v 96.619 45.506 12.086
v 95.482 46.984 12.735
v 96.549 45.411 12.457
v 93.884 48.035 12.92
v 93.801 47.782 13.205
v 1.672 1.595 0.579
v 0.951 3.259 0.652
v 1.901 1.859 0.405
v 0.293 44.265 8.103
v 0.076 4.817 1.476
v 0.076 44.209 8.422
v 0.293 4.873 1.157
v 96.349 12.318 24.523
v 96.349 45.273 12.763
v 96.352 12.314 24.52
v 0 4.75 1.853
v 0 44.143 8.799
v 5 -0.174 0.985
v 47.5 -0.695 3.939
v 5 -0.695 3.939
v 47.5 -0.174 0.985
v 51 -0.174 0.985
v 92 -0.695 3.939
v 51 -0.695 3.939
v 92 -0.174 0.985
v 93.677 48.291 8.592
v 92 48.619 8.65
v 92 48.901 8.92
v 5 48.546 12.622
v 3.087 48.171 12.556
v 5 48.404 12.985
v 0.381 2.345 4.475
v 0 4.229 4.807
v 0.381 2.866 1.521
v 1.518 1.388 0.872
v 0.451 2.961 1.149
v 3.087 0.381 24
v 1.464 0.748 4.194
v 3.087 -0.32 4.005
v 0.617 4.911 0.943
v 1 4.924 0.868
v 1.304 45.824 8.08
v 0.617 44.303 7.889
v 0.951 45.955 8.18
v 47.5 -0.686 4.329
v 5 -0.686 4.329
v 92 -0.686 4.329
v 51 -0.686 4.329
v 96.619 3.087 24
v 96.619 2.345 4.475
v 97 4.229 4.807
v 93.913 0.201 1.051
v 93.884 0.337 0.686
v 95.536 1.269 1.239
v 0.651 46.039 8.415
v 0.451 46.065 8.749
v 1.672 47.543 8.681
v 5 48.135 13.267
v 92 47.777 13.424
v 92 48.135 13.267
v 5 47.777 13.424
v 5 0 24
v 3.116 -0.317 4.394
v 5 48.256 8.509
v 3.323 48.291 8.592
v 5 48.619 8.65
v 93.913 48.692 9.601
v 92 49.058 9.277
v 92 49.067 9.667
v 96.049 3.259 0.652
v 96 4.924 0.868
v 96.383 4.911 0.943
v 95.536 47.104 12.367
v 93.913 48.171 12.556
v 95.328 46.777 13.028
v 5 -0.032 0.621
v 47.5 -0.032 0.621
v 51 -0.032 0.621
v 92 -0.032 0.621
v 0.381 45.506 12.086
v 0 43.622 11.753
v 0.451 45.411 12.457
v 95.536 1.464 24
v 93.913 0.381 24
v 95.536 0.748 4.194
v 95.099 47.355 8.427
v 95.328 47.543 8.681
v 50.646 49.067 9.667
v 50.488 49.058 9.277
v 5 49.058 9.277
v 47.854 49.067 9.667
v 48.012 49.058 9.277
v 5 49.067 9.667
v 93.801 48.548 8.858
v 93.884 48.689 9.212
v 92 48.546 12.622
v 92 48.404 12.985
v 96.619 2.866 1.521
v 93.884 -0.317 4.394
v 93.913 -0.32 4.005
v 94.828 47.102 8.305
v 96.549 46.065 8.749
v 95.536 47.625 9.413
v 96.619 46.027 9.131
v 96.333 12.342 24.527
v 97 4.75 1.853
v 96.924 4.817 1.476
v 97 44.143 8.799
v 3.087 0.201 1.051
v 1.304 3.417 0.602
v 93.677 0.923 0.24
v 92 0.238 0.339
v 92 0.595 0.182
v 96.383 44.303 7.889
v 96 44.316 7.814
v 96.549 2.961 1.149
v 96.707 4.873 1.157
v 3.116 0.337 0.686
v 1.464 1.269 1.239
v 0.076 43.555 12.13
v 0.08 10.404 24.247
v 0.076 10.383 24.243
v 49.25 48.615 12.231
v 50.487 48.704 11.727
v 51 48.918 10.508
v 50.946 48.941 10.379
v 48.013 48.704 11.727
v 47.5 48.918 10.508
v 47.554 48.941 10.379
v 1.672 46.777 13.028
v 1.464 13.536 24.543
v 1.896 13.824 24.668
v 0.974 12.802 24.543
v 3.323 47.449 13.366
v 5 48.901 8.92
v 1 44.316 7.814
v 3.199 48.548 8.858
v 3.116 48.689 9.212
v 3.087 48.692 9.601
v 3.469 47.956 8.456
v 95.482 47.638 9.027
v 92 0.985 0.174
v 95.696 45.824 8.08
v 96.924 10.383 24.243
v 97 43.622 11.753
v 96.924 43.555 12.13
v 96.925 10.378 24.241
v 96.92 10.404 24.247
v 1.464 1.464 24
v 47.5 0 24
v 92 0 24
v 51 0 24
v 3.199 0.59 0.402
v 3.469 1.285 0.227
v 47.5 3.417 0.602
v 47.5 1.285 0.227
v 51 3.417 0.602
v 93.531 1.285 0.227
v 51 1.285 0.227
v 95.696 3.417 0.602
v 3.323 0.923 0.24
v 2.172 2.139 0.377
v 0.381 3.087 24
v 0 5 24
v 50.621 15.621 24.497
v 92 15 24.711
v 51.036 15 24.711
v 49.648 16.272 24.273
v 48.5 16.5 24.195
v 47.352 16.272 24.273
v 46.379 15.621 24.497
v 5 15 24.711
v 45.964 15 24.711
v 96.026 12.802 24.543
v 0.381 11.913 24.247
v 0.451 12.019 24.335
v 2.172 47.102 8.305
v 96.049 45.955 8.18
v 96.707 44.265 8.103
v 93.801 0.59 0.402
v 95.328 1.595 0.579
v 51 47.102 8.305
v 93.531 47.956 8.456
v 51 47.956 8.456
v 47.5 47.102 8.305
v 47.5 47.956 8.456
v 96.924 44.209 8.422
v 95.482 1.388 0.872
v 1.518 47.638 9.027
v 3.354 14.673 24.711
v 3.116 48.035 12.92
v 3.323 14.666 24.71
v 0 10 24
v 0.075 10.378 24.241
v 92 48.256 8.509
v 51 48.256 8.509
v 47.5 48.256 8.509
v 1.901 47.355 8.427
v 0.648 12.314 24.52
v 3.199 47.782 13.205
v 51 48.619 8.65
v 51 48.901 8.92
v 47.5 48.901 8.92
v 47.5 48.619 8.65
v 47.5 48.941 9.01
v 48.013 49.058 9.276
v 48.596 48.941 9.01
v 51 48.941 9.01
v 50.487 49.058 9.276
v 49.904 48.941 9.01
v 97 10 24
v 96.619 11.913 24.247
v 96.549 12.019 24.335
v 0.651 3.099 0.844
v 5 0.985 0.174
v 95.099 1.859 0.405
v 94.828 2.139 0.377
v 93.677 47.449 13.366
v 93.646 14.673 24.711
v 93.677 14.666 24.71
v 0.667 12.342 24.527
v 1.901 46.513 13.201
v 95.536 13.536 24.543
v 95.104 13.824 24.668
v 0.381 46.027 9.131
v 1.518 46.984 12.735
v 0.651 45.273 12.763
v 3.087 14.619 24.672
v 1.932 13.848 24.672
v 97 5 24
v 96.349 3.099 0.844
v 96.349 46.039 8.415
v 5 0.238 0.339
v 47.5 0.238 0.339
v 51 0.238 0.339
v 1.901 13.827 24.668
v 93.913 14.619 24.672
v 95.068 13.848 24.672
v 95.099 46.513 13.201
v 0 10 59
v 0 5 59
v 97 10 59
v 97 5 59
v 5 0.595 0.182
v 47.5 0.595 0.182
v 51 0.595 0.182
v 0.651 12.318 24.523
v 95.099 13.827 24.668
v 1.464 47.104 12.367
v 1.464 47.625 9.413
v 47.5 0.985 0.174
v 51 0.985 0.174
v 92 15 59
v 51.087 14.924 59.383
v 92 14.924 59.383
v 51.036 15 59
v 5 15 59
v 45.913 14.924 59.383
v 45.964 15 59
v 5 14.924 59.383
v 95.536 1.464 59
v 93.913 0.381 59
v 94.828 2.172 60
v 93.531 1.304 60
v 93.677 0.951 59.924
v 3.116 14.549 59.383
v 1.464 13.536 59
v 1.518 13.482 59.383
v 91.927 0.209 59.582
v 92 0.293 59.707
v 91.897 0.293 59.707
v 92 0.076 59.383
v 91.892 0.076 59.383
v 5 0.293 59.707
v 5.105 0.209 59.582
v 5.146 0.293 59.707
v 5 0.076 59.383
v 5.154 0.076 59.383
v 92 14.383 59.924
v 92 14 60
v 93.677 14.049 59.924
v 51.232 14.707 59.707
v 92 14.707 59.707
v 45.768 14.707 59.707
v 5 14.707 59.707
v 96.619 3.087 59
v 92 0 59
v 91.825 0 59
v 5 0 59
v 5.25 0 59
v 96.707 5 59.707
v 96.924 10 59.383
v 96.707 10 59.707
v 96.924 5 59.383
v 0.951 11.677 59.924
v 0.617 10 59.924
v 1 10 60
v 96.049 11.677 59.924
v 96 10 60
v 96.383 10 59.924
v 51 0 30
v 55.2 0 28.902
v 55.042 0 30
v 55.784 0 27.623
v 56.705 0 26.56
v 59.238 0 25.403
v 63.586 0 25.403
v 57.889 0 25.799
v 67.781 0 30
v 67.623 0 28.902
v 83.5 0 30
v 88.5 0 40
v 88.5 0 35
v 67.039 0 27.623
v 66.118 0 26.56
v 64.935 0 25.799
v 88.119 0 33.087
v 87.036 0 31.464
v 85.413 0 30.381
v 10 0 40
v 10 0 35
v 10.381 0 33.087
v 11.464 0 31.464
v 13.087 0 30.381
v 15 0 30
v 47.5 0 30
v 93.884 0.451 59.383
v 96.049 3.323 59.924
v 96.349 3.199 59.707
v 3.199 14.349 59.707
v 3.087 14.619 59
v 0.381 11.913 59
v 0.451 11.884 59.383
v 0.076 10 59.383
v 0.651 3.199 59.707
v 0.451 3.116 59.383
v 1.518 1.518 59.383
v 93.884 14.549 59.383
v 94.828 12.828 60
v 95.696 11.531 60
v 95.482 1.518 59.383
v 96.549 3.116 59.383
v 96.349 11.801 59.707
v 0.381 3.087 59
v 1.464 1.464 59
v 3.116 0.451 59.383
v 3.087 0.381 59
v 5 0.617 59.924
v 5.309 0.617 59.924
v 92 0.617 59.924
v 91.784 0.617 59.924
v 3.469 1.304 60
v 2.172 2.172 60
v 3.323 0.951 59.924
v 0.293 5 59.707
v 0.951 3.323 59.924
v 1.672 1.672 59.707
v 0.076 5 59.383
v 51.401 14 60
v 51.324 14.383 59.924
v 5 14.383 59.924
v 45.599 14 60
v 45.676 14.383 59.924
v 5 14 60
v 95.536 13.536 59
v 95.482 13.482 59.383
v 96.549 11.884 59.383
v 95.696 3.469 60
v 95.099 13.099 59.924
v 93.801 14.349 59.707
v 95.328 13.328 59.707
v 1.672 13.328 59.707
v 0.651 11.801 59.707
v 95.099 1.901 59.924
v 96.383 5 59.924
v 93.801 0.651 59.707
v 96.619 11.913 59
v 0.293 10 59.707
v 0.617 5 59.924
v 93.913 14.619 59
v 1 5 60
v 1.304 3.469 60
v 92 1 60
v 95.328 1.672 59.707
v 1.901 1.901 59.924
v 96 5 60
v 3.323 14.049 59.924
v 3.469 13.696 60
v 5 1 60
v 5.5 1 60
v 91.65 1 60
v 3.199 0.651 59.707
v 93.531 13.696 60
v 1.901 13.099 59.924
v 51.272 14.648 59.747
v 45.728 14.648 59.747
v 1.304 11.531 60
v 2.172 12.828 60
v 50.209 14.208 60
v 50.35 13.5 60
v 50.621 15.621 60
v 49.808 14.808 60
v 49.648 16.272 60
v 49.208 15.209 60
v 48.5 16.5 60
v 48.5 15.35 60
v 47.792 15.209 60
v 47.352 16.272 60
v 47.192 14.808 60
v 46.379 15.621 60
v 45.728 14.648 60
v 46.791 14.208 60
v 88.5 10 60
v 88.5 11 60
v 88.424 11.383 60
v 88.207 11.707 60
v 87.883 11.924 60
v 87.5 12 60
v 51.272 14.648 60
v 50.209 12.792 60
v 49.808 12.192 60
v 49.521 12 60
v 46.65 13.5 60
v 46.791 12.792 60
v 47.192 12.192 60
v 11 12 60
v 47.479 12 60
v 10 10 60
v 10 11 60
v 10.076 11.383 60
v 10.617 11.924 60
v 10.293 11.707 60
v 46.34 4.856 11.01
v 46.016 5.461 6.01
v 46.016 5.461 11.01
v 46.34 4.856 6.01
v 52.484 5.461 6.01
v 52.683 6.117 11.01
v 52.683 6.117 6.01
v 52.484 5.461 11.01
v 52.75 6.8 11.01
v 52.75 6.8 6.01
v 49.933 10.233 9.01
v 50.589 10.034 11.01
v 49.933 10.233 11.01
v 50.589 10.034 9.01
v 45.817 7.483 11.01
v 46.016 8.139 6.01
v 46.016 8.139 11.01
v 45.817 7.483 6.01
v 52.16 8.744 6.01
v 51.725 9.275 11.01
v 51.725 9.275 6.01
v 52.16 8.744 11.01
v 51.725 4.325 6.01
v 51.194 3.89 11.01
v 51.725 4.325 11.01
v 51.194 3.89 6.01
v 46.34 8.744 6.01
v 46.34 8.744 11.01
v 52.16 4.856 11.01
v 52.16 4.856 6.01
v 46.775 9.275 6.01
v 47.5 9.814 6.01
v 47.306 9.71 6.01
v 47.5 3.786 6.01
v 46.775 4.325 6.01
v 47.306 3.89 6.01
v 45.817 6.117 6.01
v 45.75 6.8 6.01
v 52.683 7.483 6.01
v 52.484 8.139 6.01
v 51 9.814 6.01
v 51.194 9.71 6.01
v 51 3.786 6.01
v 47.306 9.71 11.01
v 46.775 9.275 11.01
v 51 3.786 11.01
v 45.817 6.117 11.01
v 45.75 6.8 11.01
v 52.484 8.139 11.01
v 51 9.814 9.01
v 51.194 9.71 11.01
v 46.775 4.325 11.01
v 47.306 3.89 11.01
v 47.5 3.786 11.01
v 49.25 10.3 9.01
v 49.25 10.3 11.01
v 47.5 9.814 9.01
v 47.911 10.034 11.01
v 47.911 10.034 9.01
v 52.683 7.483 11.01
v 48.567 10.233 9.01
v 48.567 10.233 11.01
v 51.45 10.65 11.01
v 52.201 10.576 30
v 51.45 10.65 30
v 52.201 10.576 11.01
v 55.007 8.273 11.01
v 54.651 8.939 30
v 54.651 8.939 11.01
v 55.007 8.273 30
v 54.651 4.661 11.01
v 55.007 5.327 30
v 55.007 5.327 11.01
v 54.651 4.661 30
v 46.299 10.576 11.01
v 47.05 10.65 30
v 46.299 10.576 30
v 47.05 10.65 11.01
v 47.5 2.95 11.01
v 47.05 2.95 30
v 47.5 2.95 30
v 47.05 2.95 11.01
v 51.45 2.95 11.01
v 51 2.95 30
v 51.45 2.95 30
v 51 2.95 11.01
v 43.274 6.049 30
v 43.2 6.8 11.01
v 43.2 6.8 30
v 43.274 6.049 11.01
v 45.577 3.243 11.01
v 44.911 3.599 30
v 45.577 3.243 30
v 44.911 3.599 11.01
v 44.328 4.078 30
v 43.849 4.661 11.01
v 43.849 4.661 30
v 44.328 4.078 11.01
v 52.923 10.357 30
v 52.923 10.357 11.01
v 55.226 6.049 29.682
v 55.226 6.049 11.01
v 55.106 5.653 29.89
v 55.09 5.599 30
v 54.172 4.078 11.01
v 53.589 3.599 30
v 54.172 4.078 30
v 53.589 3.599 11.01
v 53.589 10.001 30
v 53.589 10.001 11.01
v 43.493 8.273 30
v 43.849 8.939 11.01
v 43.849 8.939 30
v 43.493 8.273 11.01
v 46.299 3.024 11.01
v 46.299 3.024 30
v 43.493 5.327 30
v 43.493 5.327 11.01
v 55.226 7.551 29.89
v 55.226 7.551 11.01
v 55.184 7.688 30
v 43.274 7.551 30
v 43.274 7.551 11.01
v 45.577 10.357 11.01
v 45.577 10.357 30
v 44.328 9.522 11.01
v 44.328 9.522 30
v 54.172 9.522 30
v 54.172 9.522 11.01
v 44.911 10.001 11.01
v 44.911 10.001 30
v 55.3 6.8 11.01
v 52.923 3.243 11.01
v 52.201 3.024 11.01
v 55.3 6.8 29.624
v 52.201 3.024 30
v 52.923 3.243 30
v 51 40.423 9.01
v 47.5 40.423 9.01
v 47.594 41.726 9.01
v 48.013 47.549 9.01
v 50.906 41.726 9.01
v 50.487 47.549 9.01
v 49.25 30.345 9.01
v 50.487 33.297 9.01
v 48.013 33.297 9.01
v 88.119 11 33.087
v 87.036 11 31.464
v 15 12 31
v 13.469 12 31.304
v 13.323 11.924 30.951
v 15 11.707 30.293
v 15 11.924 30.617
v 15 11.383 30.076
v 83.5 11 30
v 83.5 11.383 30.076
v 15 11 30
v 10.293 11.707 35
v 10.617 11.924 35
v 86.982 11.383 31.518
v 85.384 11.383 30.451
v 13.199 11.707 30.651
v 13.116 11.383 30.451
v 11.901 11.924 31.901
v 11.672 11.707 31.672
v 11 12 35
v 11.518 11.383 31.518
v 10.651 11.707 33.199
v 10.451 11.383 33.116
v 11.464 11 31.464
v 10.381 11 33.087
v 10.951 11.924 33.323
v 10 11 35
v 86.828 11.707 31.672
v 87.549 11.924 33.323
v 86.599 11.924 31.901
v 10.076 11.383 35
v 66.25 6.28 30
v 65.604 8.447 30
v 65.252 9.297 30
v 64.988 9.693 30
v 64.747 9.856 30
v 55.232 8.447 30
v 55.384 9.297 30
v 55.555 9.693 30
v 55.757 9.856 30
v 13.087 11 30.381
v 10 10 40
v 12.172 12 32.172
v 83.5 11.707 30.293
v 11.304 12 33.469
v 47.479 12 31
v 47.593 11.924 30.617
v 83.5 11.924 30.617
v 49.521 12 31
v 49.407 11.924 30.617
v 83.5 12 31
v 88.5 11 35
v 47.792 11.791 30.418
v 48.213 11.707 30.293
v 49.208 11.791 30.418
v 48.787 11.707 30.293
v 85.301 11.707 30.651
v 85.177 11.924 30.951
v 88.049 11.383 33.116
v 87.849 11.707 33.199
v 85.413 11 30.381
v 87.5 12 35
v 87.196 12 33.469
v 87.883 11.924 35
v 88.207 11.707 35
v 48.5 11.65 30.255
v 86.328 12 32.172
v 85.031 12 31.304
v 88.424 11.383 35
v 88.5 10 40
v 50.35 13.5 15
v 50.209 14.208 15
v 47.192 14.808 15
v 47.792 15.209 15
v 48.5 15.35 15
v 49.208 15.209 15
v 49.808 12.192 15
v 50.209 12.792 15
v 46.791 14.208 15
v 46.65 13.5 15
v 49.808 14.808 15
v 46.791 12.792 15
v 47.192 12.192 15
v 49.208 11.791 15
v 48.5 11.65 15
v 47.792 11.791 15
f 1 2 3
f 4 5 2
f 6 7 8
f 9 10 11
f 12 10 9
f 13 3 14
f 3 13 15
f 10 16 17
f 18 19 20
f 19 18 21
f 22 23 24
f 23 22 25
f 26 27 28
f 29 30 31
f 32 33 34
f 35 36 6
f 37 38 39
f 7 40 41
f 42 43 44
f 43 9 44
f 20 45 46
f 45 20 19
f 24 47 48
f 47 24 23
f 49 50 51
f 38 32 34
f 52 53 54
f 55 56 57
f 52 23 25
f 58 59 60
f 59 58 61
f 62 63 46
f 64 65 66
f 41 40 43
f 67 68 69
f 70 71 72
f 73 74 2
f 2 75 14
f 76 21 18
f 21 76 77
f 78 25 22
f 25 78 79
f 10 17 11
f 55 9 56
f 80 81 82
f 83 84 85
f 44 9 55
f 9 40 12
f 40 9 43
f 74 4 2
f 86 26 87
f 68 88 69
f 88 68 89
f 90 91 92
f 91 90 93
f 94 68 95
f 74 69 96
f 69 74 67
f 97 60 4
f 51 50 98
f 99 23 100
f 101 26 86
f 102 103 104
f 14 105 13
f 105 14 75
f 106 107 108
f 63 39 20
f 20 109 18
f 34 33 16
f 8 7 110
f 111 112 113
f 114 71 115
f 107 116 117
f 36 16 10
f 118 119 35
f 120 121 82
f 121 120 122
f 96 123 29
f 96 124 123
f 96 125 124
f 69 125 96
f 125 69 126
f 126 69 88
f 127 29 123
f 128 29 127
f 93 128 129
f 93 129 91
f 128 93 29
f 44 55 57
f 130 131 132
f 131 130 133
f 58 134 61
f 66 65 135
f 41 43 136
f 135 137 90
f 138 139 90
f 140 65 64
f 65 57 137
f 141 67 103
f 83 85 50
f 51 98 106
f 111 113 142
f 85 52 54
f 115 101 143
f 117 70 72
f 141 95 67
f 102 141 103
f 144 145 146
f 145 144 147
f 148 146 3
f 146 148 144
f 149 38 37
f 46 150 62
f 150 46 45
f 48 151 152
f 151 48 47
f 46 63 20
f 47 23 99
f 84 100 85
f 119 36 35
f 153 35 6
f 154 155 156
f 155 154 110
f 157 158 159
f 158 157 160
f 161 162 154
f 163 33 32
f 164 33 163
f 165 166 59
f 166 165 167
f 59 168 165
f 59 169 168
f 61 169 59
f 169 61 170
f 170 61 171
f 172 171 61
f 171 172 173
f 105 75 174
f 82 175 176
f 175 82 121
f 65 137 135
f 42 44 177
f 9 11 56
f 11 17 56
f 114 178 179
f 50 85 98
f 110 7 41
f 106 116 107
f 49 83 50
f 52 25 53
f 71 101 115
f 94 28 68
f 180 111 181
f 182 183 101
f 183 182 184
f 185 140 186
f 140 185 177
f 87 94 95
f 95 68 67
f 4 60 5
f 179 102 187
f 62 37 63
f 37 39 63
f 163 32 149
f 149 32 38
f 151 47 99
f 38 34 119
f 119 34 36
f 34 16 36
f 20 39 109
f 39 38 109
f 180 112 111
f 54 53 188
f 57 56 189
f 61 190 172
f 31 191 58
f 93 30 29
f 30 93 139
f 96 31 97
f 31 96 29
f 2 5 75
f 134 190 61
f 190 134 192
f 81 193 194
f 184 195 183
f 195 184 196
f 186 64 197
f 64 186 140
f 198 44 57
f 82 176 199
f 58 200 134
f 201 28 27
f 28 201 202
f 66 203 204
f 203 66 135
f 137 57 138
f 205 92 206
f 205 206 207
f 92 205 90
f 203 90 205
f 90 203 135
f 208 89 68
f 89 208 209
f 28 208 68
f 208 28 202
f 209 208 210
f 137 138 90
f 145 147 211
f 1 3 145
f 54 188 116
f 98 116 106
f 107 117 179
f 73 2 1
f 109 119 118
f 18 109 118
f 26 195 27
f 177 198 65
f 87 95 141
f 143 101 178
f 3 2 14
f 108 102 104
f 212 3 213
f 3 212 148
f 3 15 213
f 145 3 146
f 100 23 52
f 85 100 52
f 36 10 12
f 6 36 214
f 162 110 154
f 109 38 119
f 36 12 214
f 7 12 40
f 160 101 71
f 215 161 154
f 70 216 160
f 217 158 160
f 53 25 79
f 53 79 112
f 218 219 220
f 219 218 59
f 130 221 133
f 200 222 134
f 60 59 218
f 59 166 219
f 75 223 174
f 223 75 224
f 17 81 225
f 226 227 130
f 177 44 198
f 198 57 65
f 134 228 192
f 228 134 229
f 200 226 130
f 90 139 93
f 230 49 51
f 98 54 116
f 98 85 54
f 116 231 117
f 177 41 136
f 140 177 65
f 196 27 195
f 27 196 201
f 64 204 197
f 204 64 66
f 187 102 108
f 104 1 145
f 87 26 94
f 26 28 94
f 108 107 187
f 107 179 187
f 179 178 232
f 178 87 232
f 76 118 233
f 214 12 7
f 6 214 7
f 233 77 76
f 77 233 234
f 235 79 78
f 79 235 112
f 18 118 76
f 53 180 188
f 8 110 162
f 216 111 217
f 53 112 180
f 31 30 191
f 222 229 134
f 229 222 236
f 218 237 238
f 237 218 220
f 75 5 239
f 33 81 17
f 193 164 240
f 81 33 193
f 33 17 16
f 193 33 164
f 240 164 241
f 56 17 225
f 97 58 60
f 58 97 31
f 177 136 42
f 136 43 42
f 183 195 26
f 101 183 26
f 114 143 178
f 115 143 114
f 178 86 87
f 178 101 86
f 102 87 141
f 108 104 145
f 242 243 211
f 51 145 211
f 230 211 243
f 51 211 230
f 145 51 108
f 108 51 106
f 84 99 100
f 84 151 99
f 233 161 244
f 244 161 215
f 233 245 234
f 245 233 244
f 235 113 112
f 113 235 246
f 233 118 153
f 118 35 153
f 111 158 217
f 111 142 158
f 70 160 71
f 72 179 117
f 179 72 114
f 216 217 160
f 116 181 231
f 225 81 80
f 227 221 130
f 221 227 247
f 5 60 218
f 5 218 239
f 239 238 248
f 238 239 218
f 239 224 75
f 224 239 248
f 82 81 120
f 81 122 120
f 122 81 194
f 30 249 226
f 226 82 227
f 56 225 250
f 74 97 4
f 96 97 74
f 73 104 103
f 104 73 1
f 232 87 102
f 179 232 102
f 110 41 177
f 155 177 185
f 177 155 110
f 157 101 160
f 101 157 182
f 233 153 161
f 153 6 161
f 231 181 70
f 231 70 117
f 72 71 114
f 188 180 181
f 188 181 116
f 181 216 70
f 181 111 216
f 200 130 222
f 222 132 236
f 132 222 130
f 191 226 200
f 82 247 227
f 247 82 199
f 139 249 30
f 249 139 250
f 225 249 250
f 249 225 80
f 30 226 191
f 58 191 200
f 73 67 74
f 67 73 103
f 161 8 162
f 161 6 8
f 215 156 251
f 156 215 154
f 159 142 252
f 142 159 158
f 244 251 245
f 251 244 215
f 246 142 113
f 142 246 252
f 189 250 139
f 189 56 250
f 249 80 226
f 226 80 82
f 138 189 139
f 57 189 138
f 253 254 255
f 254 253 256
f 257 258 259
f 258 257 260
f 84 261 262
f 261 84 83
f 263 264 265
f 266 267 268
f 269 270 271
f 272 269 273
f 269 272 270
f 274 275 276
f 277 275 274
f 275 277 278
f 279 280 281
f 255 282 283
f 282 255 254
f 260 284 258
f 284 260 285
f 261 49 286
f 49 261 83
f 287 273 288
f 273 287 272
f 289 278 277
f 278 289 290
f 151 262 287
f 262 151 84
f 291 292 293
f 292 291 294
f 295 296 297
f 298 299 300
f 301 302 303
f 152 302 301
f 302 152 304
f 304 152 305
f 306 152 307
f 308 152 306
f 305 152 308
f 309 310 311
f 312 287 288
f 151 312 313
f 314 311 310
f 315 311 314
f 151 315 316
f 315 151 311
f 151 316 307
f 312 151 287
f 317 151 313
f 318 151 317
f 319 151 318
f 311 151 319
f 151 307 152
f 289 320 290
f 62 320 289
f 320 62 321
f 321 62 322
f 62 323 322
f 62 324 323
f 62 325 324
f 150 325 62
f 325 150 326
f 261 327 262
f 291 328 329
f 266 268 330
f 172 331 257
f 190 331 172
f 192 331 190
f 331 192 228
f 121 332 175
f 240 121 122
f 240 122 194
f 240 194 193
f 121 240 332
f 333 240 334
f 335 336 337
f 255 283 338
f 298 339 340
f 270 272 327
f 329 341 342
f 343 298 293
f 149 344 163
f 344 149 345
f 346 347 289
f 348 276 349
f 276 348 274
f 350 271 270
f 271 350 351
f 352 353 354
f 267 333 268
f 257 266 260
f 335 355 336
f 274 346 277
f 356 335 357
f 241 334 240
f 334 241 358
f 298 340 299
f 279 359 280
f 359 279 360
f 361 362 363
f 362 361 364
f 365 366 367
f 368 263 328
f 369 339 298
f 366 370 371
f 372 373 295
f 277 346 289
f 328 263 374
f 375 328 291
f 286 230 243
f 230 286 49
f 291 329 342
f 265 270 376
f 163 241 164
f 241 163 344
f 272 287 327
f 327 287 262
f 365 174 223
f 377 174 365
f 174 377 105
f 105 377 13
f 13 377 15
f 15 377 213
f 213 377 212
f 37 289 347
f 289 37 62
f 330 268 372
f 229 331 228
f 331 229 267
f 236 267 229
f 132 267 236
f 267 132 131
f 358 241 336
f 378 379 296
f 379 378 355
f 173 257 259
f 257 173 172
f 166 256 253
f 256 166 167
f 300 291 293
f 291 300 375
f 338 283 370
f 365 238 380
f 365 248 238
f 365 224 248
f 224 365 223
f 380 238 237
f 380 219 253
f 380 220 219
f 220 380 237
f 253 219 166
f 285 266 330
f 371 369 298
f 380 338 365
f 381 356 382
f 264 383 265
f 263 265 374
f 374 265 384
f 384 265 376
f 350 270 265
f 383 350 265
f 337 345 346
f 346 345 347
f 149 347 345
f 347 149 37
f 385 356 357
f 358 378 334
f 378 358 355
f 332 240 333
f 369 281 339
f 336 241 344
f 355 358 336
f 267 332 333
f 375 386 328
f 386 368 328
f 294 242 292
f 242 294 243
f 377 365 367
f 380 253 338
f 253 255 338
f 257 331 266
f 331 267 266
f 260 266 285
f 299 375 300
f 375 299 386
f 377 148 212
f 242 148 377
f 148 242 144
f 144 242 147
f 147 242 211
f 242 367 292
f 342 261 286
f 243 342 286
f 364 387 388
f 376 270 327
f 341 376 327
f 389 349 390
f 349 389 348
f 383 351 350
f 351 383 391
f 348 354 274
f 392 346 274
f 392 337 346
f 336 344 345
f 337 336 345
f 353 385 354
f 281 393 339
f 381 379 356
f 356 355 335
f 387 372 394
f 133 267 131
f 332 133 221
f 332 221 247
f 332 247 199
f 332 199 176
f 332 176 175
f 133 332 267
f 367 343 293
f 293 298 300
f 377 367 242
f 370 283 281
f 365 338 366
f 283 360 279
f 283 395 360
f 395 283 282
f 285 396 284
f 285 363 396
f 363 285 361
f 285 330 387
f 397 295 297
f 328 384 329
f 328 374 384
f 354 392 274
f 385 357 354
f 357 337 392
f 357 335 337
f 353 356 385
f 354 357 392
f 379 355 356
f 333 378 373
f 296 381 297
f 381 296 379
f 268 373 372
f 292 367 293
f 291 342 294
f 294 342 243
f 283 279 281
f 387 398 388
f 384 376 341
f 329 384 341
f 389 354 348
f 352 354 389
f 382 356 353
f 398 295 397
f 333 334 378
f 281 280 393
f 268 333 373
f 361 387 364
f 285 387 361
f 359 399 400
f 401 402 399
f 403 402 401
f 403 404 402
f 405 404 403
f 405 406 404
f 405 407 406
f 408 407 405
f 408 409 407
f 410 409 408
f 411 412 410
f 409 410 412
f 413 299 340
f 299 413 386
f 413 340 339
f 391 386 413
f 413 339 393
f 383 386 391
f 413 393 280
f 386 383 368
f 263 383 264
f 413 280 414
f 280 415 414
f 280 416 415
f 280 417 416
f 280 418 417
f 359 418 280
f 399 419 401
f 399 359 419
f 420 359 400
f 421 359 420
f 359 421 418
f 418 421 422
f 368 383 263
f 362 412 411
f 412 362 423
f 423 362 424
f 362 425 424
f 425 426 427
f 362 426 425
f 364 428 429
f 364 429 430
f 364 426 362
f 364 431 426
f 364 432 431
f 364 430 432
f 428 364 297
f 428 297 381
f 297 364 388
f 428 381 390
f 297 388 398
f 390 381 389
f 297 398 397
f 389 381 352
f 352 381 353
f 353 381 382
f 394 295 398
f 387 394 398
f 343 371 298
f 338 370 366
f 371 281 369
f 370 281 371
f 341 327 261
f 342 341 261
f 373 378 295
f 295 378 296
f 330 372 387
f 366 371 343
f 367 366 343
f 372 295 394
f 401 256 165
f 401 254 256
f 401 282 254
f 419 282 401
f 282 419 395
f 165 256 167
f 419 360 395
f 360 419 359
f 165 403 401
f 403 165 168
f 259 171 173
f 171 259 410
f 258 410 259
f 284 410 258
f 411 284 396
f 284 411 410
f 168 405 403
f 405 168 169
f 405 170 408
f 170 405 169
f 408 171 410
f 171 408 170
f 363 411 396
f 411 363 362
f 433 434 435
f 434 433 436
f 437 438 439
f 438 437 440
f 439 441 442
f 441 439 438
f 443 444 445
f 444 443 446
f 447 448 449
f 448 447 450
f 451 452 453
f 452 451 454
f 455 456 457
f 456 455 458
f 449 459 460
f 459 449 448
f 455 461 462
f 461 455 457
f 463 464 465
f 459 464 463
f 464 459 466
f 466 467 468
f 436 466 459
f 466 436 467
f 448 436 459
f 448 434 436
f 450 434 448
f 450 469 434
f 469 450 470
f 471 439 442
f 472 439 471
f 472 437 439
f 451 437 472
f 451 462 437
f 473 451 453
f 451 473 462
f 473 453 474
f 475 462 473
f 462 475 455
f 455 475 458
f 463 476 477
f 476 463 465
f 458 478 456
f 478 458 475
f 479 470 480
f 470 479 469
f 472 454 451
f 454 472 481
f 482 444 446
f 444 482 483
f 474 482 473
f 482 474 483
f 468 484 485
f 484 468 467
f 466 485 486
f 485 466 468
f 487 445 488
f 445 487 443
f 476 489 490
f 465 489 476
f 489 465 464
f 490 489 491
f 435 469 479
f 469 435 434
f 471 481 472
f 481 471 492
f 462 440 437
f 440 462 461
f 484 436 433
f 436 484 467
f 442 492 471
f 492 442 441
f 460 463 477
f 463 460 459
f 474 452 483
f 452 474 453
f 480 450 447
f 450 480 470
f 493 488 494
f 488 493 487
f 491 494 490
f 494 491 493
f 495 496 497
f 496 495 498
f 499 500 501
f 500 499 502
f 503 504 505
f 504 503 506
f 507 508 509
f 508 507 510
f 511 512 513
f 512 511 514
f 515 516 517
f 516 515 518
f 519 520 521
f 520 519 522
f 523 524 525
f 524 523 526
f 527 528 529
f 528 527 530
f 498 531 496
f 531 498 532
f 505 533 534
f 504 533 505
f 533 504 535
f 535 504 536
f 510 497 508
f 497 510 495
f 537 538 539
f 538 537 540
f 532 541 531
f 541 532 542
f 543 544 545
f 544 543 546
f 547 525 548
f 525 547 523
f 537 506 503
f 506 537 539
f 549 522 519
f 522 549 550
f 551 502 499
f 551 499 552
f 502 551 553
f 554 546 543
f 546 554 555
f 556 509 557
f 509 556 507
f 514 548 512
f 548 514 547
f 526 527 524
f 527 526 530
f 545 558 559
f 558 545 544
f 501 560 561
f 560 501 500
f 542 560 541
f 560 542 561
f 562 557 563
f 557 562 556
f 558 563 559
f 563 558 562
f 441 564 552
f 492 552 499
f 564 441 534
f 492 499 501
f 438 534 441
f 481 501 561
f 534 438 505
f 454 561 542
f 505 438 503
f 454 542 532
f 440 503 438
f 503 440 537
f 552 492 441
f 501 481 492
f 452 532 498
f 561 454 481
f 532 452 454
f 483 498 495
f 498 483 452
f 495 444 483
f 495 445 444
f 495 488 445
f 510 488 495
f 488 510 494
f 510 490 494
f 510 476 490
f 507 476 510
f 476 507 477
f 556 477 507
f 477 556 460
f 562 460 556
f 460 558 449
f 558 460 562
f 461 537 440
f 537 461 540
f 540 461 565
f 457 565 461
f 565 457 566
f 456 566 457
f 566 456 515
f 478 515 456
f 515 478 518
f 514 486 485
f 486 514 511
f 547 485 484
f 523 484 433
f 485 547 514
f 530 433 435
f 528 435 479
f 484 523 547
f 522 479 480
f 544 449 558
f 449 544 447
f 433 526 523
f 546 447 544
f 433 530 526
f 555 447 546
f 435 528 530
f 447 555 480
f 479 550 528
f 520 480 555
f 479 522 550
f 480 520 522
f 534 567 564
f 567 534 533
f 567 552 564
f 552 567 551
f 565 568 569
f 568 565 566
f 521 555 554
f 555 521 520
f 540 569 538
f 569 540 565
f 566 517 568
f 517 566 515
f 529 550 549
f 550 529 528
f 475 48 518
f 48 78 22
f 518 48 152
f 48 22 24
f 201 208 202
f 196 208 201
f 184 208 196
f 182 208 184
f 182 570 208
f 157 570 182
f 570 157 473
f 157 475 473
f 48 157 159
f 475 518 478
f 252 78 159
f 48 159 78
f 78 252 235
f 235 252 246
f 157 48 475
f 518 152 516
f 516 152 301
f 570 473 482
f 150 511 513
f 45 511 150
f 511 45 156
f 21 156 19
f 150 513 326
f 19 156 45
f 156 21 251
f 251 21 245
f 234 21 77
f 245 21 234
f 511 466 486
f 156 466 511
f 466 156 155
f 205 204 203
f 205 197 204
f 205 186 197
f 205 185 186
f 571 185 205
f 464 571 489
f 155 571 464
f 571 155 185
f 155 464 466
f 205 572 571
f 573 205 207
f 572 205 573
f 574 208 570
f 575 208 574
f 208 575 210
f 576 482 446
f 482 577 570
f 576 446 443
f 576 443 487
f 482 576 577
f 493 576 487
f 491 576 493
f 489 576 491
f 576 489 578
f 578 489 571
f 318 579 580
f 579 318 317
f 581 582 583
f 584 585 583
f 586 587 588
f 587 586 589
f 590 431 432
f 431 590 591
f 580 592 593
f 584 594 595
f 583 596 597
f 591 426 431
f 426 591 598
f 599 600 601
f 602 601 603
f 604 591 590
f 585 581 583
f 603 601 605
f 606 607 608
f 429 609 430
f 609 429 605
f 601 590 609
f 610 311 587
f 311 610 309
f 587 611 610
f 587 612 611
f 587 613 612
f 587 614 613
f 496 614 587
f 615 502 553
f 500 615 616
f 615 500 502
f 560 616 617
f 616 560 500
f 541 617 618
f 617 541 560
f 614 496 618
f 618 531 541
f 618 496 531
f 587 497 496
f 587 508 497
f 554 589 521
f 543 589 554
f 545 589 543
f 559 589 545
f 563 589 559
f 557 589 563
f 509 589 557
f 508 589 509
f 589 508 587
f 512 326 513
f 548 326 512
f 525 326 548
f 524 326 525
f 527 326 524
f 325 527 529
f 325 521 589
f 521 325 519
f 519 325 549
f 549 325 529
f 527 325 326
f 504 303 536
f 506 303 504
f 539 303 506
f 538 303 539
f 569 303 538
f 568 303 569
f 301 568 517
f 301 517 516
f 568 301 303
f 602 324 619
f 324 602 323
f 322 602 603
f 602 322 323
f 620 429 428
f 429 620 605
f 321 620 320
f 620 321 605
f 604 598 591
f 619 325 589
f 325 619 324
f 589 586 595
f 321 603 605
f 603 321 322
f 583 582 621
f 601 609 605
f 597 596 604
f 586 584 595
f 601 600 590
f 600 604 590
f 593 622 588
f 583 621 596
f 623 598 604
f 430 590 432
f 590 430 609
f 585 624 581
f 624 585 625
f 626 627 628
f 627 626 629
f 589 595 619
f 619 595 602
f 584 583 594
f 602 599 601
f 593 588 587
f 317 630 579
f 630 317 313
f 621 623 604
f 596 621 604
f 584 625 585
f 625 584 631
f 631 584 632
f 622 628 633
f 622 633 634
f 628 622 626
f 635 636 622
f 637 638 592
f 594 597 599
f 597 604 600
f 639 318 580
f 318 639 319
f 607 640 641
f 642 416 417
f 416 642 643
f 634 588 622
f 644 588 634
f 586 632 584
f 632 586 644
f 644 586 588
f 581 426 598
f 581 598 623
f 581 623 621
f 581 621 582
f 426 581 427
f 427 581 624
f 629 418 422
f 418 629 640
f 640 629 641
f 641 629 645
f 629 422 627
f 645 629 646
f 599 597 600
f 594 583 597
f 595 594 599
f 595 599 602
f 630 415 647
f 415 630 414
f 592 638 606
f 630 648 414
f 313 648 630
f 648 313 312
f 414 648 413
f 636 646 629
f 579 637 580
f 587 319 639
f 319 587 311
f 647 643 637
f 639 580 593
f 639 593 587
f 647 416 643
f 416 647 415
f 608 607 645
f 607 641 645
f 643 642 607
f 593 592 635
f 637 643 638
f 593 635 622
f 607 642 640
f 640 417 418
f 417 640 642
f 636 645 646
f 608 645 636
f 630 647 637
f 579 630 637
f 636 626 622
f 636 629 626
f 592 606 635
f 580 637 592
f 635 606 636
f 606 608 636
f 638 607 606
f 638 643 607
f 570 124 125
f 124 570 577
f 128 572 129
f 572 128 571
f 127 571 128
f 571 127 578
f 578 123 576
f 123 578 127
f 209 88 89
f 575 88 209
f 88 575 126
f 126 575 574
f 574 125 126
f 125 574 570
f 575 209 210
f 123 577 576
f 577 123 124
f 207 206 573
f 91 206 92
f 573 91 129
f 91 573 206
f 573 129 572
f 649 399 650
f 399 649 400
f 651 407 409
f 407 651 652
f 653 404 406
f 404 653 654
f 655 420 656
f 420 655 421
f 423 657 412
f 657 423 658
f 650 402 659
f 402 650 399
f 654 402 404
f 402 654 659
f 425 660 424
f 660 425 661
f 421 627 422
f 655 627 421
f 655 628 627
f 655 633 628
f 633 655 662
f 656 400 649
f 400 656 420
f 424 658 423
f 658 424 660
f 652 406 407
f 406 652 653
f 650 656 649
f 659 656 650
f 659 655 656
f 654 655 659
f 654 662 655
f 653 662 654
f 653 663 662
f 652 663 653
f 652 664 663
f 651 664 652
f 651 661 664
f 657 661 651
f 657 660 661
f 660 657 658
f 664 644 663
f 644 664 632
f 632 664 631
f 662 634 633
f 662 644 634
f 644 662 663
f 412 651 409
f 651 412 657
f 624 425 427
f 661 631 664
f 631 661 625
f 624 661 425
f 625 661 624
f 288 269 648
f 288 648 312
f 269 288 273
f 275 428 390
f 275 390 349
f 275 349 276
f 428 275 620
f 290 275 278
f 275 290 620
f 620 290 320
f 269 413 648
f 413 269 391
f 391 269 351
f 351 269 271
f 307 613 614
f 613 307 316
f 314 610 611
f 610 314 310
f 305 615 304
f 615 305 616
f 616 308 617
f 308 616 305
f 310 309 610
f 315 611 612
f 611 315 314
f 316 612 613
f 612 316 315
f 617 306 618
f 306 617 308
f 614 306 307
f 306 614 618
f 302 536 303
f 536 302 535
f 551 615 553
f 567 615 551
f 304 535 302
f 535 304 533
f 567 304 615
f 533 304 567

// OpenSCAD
module torus() {
    rotate_extrude() {
        translate([4,0])
            circle(r=1, $fn=16);
    }
}
module roundedbox(w,h,d){
    // torus has r=5 h=2
    tr = 5;
    trh = 1;
    hull(){        
        translate([  tr,  tr,  trh])torus();
        translate([w-tr,  tr,  trh])torus();
        translate([w-tr,h-tr,  trh])torus();
        translate([  tr,h-tr,  trh])torus();
        translate([  tr,  tr,d-trh])torus();
        translate([w-tr,  tr,d-trh])torus();
        translate([w-tr,h-tr,d-trh])torus();
        translate([  tr,h-tr,d-trh])torus();
    }
}
module phone(){
    roundedbox(    w=78.5,    d=/*13.8*/25,    h=160);
}

module chargecable()    
{
    translate([78.5/2,0.01+1.,5.2])
    {
        rotate([90,0,0])
        {
        color("white") cylinder(d=7,h=25, $fn=32);
        color("white") cylinder(d=3.5,h=27, $fn=32);
        color("gray") hull()
            {
                // width 12.1 d7.7 = 4.4 hoh
                translate([-2.2,0]) cylinder(h=20, d=7.7, $fn=32);
                translate([ 2.2,0]) cylinder(h=20, d=7.7, $fn=32);
            }
        
        color("lightgray") hull()
            {
                // width 8.4 d2.4 = 6 hoh
                translate([-3,0,-6.7]) cylinder(h=20, d=2.4, $fn=32);
                translate([ 3,0,-6.7]) cylinder(h=20, d=2.4, $fn=32);
            }    
        }
    }
}

difference() {
    union() {
        hull() {
            rotate([10,0])roundedbox(97,50,5);
            translate([0,0,10])
             roundedbox(97,15,15);
        }
        translate([0,0,10])
            roundedbox(97,15,50);
        
        translate([97/2, 13.5, 10])
            cylinder(d=6, h=50, $fn=16);
    }
    translate([10,12,30])
    {
        rotate([90,0,0])
        {
            phone();
            chargecable();
            translate([78.5/2,0.01,7.2]){
                translate([0,-30,15])
                    cube([3.5,60,30], center=true);
                
                translate([0,-35,0])
                    cube([3.5,28,95], center=true);
            }
                            
        }
        
        translate([78.5/2,0.01,-26])
        rotate([100,0,0])
            cylinder(d=3.5, h=95, center=true, $fn=8);
        
           
    }
        

    translate([97/2, 13.5, 15])
            cylinder(d=3.7, h=70, $fn=16);
    
    hull()
    {
        translate([10,-5,40])
            cube([78.5, 15, 20]);
        translate([5,-5,60])
            cube([87, 5, 20]);
    }
    
    hull()
    {
        translate([55,-3,31])
            cube([10, 15, 2]);
        translate([55+7,-5,30])
            rotate([90,0,0])
            cylinder(r=7, h=1);
    }
}
if($preview){
    translate([10,12,30])
    {
        rotate([90,0,0])
        { 
            chargecable();
        }
    }
}
//*/
